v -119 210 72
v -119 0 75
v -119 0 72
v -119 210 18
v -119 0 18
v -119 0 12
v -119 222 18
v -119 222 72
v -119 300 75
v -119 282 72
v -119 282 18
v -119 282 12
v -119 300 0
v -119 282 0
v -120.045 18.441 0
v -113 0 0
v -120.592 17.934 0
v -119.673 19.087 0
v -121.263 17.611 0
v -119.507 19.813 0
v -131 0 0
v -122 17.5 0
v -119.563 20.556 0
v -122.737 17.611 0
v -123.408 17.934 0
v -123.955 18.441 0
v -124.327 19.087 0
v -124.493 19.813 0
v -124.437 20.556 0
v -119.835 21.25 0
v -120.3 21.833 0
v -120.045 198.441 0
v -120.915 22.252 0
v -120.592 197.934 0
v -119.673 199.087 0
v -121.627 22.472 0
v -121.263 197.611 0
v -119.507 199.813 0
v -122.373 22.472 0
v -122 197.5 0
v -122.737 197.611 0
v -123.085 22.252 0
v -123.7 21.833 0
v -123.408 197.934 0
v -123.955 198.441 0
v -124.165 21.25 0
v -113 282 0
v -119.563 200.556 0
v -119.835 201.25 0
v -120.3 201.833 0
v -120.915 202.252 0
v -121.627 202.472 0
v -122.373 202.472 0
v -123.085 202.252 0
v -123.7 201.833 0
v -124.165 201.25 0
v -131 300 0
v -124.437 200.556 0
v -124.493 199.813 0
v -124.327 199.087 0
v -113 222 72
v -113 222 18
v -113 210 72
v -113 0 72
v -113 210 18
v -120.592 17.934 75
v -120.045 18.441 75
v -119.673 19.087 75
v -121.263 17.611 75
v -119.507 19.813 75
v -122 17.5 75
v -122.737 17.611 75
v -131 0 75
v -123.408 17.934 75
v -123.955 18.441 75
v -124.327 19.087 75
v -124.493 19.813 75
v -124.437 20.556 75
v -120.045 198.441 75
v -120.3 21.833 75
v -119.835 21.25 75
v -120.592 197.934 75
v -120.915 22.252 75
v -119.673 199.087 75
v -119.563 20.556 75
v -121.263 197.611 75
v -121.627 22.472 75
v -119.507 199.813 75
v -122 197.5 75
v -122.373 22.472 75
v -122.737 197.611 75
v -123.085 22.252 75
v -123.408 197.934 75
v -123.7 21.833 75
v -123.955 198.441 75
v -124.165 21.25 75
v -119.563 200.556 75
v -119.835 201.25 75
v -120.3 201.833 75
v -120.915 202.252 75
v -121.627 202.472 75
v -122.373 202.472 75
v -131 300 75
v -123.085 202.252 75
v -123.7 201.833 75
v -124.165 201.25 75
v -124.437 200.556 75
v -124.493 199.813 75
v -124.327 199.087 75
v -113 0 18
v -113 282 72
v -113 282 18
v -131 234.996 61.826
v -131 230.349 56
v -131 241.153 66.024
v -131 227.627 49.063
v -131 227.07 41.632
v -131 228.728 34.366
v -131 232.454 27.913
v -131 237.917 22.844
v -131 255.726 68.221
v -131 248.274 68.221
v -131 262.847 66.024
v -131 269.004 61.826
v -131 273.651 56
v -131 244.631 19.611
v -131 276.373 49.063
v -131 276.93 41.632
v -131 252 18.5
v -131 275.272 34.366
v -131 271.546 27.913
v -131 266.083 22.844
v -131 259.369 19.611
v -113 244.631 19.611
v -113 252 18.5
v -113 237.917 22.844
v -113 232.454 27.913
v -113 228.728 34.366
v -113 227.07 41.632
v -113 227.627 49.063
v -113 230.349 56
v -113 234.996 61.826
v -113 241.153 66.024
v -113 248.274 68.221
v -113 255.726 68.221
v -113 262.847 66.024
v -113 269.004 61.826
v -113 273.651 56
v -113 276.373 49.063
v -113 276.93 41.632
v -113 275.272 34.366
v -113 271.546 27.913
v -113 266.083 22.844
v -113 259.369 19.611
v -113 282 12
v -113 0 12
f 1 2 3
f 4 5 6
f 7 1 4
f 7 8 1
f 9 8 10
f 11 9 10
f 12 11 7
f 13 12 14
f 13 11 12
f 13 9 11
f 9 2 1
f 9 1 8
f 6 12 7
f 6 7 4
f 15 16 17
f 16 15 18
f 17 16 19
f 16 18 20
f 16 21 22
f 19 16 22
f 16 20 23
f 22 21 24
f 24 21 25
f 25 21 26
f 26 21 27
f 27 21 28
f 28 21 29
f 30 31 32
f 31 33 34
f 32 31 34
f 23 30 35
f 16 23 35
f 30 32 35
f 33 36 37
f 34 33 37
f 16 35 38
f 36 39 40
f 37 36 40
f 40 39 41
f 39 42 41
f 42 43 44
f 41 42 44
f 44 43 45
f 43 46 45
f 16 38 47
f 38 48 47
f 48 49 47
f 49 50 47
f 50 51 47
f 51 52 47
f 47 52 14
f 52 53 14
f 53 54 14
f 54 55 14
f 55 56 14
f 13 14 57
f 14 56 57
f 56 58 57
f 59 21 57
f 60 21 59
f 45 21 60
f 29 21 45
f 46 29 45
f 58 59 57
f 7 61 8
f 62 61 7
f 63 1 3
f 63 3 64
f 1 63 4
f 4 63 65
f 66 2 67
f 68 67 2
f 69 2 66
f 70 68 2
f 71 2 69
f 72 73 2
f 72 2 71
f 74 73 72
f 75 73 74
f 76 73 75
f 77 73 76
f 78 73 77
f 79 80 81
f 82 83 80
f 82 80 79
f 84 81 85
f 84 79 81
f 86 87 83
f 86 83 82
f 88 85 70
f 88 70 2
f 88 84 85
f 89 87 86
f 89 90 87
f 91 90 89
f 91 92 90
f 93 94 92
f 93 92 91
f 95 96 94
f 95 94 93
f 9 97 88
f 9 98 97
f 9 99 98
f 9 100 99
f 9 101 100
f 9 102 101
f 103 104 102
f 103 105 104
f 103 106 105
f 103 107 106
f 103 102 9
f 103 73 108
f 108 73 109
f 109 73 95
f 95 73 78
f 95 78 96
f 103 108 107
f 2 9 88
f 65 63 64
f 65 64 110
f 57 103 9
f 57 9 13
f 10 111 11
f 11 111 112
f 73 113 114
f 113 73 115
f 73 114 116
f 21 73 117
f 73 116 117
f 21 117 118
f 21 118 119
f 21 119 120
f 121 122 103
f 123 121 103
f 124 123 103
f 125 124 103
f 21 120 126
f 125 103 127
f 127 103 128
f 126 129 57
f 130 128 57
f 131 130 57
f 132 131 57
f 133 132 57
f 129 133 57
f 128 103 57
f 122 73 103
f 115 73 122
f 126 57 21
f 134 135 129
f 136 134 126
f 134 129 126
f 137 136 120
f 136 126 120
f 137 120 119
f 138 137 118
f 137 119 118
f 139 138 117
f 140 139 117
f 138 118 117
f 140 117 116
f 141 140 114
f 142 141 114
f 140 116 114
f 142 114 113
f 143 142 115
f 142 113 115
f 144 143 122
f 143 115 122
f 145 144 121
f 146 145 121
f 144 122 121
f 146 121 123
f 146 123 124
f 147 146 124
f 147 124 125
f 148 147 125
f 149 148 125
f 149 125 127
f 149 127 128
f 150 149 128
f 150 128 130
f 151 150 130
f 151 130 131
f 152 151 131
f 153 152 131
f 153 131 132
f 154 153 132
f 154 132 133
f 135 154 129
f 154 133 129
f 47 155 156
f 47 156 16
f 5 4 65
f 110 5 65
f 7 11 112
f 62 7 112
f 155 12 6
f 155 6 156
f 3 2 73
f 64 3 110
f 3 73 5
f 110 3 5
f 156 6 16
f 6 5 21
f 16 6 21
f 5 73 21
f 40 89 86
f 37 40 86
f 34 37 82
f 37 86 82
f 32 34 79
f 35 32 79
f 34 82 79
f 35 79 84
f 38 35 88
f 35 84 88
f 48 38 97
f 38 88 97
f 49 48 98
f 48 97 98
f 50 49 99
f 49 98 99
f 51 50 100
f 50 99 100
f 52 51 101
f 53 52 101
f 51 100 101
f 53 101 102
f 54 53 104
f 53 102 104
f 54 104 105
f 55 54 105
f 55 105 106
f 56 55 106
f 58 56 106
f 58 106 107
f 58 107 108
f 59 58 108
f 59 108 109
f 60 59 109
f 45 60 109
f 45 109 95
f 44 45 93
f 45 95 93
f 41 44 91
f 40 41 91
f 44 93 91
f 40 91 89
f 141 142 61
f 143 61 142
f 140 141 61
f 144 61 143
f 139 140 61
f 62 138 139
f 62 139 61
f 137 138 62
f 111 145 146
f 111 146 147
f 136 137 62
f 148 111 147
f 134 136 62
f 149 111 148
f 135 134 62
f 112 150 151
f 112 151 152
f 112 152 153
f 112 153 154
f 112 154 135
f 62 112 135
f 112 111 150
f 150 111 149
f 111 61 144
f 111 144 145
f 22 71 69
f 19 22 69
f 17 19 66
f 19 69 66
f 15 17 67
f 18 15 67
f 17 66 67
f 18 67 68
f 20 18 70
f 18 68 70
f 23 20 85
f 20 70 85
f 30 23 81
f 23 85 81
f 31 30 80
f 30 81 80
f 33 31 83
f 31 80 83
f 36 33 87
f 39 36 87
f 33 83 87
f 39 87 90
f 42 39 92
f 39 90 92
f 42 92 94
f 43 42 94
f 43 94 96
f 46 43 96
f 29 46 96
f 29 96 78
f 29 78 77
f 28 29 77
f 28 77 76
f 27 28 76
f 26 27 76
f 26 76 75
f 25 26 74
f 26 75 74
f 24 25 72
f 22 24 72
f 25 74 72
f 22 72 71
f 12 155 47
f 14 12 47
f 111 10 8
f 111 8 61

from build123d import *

# Parameters (mm, degrees)
SKETCH021_W             = 75
SKETCH021_H             = 300
PAD007_DEPTH            = 18
SKETCH023_W             = 75
SKETCH023_H             = 18
SKETCH023_W_2           = 57
SKETCH023_H_2           = 12
POCKET014_DEPTH         = 6
SKETCH022_W             = 6
SKETCH022_H             = 6
SKETCH022_W_2           = 3
POCKET015_DEPTH         = 300
SKETCH024_R             = 25
POCKET016_DEPTH         = 18
SKETCH031_R             = 2.5
POCKET020_DEPTH         = 75
BODY008_PLACEMENT_ANGLE = 90


with BuildPart() as part:
    # Sketch021 → Pad007 (new body)
    with BuildSketch(Plane.XY):
        with Locations((-37.5, 150)):
            Rectangle(SKETCH021_W, SKETCH021_H)
    extrude(amount=PAD007_DEPTH)

    # Sketch023 → Pocket014 (cut)
    with BuildSketch(Plane.XY.offset(18)):
        with Locations((-37.5, 291)):
            Rectangle(SKETCH023_W, SKETCH023_H)
        with Locations((-46.5, 216)):
            Rectangle(SKETCH023_W_2, SKETCH023_H_2)
    extrude(amount=-POCKET014_DEPTH, mode=Mode.SUBTRACT)

    # Sketch022 → Pocket015 (cut)
    with BuildSketch(Plane.XZ):
        with Locations((-15, 15)):
            Rectangle(SKETCH022_W, SKETCH022_H)
        with Locations((-73.5, 15)):
            Rectangle(SKETCH022_W_2, SKETCH022_H)
    extrude(amount=-POCKET015_DEPTH, mode=Mode.SUBTRACT)

    # Sketch024 → Pocket016 (cut)
    with BuildSketch(Plane(origin=(0, 0, 0), x_dir=(1, 0, 0), z_dir=(0, 0, -1))):
        with Locations((-43.5, -252)):
            Circle(SKETCH024_R)
    extrude(amount=-POCKET016_DEPTH, mode=Mode.SUBTRACT)

    # Sketch031 → Pocket020 (cut)
    with BuildSketch(Plane(origin=(-75, 0, 0), x_dir=(0, -1, 0), z_dir=(-1, 0, 0))):
        with Locations((-20, 9)):
            Circle(SKETCH031_R)
        with Locations((-200, 9)):
            Circle(SKETCH031_R)
    extrude(amount=-POCKET020_DEPTH, mode=Mode.SUBTRACT)


with BuildPart() as part_1:
    # Body008 placement: moved
    add(part.part.moved(Location((-131, 0, 0))).rotate(Axis((-131, 0, 0), (0, 1, 0)), BODY008_PLACEMENT_ANGLE))


solid = part_1.part
